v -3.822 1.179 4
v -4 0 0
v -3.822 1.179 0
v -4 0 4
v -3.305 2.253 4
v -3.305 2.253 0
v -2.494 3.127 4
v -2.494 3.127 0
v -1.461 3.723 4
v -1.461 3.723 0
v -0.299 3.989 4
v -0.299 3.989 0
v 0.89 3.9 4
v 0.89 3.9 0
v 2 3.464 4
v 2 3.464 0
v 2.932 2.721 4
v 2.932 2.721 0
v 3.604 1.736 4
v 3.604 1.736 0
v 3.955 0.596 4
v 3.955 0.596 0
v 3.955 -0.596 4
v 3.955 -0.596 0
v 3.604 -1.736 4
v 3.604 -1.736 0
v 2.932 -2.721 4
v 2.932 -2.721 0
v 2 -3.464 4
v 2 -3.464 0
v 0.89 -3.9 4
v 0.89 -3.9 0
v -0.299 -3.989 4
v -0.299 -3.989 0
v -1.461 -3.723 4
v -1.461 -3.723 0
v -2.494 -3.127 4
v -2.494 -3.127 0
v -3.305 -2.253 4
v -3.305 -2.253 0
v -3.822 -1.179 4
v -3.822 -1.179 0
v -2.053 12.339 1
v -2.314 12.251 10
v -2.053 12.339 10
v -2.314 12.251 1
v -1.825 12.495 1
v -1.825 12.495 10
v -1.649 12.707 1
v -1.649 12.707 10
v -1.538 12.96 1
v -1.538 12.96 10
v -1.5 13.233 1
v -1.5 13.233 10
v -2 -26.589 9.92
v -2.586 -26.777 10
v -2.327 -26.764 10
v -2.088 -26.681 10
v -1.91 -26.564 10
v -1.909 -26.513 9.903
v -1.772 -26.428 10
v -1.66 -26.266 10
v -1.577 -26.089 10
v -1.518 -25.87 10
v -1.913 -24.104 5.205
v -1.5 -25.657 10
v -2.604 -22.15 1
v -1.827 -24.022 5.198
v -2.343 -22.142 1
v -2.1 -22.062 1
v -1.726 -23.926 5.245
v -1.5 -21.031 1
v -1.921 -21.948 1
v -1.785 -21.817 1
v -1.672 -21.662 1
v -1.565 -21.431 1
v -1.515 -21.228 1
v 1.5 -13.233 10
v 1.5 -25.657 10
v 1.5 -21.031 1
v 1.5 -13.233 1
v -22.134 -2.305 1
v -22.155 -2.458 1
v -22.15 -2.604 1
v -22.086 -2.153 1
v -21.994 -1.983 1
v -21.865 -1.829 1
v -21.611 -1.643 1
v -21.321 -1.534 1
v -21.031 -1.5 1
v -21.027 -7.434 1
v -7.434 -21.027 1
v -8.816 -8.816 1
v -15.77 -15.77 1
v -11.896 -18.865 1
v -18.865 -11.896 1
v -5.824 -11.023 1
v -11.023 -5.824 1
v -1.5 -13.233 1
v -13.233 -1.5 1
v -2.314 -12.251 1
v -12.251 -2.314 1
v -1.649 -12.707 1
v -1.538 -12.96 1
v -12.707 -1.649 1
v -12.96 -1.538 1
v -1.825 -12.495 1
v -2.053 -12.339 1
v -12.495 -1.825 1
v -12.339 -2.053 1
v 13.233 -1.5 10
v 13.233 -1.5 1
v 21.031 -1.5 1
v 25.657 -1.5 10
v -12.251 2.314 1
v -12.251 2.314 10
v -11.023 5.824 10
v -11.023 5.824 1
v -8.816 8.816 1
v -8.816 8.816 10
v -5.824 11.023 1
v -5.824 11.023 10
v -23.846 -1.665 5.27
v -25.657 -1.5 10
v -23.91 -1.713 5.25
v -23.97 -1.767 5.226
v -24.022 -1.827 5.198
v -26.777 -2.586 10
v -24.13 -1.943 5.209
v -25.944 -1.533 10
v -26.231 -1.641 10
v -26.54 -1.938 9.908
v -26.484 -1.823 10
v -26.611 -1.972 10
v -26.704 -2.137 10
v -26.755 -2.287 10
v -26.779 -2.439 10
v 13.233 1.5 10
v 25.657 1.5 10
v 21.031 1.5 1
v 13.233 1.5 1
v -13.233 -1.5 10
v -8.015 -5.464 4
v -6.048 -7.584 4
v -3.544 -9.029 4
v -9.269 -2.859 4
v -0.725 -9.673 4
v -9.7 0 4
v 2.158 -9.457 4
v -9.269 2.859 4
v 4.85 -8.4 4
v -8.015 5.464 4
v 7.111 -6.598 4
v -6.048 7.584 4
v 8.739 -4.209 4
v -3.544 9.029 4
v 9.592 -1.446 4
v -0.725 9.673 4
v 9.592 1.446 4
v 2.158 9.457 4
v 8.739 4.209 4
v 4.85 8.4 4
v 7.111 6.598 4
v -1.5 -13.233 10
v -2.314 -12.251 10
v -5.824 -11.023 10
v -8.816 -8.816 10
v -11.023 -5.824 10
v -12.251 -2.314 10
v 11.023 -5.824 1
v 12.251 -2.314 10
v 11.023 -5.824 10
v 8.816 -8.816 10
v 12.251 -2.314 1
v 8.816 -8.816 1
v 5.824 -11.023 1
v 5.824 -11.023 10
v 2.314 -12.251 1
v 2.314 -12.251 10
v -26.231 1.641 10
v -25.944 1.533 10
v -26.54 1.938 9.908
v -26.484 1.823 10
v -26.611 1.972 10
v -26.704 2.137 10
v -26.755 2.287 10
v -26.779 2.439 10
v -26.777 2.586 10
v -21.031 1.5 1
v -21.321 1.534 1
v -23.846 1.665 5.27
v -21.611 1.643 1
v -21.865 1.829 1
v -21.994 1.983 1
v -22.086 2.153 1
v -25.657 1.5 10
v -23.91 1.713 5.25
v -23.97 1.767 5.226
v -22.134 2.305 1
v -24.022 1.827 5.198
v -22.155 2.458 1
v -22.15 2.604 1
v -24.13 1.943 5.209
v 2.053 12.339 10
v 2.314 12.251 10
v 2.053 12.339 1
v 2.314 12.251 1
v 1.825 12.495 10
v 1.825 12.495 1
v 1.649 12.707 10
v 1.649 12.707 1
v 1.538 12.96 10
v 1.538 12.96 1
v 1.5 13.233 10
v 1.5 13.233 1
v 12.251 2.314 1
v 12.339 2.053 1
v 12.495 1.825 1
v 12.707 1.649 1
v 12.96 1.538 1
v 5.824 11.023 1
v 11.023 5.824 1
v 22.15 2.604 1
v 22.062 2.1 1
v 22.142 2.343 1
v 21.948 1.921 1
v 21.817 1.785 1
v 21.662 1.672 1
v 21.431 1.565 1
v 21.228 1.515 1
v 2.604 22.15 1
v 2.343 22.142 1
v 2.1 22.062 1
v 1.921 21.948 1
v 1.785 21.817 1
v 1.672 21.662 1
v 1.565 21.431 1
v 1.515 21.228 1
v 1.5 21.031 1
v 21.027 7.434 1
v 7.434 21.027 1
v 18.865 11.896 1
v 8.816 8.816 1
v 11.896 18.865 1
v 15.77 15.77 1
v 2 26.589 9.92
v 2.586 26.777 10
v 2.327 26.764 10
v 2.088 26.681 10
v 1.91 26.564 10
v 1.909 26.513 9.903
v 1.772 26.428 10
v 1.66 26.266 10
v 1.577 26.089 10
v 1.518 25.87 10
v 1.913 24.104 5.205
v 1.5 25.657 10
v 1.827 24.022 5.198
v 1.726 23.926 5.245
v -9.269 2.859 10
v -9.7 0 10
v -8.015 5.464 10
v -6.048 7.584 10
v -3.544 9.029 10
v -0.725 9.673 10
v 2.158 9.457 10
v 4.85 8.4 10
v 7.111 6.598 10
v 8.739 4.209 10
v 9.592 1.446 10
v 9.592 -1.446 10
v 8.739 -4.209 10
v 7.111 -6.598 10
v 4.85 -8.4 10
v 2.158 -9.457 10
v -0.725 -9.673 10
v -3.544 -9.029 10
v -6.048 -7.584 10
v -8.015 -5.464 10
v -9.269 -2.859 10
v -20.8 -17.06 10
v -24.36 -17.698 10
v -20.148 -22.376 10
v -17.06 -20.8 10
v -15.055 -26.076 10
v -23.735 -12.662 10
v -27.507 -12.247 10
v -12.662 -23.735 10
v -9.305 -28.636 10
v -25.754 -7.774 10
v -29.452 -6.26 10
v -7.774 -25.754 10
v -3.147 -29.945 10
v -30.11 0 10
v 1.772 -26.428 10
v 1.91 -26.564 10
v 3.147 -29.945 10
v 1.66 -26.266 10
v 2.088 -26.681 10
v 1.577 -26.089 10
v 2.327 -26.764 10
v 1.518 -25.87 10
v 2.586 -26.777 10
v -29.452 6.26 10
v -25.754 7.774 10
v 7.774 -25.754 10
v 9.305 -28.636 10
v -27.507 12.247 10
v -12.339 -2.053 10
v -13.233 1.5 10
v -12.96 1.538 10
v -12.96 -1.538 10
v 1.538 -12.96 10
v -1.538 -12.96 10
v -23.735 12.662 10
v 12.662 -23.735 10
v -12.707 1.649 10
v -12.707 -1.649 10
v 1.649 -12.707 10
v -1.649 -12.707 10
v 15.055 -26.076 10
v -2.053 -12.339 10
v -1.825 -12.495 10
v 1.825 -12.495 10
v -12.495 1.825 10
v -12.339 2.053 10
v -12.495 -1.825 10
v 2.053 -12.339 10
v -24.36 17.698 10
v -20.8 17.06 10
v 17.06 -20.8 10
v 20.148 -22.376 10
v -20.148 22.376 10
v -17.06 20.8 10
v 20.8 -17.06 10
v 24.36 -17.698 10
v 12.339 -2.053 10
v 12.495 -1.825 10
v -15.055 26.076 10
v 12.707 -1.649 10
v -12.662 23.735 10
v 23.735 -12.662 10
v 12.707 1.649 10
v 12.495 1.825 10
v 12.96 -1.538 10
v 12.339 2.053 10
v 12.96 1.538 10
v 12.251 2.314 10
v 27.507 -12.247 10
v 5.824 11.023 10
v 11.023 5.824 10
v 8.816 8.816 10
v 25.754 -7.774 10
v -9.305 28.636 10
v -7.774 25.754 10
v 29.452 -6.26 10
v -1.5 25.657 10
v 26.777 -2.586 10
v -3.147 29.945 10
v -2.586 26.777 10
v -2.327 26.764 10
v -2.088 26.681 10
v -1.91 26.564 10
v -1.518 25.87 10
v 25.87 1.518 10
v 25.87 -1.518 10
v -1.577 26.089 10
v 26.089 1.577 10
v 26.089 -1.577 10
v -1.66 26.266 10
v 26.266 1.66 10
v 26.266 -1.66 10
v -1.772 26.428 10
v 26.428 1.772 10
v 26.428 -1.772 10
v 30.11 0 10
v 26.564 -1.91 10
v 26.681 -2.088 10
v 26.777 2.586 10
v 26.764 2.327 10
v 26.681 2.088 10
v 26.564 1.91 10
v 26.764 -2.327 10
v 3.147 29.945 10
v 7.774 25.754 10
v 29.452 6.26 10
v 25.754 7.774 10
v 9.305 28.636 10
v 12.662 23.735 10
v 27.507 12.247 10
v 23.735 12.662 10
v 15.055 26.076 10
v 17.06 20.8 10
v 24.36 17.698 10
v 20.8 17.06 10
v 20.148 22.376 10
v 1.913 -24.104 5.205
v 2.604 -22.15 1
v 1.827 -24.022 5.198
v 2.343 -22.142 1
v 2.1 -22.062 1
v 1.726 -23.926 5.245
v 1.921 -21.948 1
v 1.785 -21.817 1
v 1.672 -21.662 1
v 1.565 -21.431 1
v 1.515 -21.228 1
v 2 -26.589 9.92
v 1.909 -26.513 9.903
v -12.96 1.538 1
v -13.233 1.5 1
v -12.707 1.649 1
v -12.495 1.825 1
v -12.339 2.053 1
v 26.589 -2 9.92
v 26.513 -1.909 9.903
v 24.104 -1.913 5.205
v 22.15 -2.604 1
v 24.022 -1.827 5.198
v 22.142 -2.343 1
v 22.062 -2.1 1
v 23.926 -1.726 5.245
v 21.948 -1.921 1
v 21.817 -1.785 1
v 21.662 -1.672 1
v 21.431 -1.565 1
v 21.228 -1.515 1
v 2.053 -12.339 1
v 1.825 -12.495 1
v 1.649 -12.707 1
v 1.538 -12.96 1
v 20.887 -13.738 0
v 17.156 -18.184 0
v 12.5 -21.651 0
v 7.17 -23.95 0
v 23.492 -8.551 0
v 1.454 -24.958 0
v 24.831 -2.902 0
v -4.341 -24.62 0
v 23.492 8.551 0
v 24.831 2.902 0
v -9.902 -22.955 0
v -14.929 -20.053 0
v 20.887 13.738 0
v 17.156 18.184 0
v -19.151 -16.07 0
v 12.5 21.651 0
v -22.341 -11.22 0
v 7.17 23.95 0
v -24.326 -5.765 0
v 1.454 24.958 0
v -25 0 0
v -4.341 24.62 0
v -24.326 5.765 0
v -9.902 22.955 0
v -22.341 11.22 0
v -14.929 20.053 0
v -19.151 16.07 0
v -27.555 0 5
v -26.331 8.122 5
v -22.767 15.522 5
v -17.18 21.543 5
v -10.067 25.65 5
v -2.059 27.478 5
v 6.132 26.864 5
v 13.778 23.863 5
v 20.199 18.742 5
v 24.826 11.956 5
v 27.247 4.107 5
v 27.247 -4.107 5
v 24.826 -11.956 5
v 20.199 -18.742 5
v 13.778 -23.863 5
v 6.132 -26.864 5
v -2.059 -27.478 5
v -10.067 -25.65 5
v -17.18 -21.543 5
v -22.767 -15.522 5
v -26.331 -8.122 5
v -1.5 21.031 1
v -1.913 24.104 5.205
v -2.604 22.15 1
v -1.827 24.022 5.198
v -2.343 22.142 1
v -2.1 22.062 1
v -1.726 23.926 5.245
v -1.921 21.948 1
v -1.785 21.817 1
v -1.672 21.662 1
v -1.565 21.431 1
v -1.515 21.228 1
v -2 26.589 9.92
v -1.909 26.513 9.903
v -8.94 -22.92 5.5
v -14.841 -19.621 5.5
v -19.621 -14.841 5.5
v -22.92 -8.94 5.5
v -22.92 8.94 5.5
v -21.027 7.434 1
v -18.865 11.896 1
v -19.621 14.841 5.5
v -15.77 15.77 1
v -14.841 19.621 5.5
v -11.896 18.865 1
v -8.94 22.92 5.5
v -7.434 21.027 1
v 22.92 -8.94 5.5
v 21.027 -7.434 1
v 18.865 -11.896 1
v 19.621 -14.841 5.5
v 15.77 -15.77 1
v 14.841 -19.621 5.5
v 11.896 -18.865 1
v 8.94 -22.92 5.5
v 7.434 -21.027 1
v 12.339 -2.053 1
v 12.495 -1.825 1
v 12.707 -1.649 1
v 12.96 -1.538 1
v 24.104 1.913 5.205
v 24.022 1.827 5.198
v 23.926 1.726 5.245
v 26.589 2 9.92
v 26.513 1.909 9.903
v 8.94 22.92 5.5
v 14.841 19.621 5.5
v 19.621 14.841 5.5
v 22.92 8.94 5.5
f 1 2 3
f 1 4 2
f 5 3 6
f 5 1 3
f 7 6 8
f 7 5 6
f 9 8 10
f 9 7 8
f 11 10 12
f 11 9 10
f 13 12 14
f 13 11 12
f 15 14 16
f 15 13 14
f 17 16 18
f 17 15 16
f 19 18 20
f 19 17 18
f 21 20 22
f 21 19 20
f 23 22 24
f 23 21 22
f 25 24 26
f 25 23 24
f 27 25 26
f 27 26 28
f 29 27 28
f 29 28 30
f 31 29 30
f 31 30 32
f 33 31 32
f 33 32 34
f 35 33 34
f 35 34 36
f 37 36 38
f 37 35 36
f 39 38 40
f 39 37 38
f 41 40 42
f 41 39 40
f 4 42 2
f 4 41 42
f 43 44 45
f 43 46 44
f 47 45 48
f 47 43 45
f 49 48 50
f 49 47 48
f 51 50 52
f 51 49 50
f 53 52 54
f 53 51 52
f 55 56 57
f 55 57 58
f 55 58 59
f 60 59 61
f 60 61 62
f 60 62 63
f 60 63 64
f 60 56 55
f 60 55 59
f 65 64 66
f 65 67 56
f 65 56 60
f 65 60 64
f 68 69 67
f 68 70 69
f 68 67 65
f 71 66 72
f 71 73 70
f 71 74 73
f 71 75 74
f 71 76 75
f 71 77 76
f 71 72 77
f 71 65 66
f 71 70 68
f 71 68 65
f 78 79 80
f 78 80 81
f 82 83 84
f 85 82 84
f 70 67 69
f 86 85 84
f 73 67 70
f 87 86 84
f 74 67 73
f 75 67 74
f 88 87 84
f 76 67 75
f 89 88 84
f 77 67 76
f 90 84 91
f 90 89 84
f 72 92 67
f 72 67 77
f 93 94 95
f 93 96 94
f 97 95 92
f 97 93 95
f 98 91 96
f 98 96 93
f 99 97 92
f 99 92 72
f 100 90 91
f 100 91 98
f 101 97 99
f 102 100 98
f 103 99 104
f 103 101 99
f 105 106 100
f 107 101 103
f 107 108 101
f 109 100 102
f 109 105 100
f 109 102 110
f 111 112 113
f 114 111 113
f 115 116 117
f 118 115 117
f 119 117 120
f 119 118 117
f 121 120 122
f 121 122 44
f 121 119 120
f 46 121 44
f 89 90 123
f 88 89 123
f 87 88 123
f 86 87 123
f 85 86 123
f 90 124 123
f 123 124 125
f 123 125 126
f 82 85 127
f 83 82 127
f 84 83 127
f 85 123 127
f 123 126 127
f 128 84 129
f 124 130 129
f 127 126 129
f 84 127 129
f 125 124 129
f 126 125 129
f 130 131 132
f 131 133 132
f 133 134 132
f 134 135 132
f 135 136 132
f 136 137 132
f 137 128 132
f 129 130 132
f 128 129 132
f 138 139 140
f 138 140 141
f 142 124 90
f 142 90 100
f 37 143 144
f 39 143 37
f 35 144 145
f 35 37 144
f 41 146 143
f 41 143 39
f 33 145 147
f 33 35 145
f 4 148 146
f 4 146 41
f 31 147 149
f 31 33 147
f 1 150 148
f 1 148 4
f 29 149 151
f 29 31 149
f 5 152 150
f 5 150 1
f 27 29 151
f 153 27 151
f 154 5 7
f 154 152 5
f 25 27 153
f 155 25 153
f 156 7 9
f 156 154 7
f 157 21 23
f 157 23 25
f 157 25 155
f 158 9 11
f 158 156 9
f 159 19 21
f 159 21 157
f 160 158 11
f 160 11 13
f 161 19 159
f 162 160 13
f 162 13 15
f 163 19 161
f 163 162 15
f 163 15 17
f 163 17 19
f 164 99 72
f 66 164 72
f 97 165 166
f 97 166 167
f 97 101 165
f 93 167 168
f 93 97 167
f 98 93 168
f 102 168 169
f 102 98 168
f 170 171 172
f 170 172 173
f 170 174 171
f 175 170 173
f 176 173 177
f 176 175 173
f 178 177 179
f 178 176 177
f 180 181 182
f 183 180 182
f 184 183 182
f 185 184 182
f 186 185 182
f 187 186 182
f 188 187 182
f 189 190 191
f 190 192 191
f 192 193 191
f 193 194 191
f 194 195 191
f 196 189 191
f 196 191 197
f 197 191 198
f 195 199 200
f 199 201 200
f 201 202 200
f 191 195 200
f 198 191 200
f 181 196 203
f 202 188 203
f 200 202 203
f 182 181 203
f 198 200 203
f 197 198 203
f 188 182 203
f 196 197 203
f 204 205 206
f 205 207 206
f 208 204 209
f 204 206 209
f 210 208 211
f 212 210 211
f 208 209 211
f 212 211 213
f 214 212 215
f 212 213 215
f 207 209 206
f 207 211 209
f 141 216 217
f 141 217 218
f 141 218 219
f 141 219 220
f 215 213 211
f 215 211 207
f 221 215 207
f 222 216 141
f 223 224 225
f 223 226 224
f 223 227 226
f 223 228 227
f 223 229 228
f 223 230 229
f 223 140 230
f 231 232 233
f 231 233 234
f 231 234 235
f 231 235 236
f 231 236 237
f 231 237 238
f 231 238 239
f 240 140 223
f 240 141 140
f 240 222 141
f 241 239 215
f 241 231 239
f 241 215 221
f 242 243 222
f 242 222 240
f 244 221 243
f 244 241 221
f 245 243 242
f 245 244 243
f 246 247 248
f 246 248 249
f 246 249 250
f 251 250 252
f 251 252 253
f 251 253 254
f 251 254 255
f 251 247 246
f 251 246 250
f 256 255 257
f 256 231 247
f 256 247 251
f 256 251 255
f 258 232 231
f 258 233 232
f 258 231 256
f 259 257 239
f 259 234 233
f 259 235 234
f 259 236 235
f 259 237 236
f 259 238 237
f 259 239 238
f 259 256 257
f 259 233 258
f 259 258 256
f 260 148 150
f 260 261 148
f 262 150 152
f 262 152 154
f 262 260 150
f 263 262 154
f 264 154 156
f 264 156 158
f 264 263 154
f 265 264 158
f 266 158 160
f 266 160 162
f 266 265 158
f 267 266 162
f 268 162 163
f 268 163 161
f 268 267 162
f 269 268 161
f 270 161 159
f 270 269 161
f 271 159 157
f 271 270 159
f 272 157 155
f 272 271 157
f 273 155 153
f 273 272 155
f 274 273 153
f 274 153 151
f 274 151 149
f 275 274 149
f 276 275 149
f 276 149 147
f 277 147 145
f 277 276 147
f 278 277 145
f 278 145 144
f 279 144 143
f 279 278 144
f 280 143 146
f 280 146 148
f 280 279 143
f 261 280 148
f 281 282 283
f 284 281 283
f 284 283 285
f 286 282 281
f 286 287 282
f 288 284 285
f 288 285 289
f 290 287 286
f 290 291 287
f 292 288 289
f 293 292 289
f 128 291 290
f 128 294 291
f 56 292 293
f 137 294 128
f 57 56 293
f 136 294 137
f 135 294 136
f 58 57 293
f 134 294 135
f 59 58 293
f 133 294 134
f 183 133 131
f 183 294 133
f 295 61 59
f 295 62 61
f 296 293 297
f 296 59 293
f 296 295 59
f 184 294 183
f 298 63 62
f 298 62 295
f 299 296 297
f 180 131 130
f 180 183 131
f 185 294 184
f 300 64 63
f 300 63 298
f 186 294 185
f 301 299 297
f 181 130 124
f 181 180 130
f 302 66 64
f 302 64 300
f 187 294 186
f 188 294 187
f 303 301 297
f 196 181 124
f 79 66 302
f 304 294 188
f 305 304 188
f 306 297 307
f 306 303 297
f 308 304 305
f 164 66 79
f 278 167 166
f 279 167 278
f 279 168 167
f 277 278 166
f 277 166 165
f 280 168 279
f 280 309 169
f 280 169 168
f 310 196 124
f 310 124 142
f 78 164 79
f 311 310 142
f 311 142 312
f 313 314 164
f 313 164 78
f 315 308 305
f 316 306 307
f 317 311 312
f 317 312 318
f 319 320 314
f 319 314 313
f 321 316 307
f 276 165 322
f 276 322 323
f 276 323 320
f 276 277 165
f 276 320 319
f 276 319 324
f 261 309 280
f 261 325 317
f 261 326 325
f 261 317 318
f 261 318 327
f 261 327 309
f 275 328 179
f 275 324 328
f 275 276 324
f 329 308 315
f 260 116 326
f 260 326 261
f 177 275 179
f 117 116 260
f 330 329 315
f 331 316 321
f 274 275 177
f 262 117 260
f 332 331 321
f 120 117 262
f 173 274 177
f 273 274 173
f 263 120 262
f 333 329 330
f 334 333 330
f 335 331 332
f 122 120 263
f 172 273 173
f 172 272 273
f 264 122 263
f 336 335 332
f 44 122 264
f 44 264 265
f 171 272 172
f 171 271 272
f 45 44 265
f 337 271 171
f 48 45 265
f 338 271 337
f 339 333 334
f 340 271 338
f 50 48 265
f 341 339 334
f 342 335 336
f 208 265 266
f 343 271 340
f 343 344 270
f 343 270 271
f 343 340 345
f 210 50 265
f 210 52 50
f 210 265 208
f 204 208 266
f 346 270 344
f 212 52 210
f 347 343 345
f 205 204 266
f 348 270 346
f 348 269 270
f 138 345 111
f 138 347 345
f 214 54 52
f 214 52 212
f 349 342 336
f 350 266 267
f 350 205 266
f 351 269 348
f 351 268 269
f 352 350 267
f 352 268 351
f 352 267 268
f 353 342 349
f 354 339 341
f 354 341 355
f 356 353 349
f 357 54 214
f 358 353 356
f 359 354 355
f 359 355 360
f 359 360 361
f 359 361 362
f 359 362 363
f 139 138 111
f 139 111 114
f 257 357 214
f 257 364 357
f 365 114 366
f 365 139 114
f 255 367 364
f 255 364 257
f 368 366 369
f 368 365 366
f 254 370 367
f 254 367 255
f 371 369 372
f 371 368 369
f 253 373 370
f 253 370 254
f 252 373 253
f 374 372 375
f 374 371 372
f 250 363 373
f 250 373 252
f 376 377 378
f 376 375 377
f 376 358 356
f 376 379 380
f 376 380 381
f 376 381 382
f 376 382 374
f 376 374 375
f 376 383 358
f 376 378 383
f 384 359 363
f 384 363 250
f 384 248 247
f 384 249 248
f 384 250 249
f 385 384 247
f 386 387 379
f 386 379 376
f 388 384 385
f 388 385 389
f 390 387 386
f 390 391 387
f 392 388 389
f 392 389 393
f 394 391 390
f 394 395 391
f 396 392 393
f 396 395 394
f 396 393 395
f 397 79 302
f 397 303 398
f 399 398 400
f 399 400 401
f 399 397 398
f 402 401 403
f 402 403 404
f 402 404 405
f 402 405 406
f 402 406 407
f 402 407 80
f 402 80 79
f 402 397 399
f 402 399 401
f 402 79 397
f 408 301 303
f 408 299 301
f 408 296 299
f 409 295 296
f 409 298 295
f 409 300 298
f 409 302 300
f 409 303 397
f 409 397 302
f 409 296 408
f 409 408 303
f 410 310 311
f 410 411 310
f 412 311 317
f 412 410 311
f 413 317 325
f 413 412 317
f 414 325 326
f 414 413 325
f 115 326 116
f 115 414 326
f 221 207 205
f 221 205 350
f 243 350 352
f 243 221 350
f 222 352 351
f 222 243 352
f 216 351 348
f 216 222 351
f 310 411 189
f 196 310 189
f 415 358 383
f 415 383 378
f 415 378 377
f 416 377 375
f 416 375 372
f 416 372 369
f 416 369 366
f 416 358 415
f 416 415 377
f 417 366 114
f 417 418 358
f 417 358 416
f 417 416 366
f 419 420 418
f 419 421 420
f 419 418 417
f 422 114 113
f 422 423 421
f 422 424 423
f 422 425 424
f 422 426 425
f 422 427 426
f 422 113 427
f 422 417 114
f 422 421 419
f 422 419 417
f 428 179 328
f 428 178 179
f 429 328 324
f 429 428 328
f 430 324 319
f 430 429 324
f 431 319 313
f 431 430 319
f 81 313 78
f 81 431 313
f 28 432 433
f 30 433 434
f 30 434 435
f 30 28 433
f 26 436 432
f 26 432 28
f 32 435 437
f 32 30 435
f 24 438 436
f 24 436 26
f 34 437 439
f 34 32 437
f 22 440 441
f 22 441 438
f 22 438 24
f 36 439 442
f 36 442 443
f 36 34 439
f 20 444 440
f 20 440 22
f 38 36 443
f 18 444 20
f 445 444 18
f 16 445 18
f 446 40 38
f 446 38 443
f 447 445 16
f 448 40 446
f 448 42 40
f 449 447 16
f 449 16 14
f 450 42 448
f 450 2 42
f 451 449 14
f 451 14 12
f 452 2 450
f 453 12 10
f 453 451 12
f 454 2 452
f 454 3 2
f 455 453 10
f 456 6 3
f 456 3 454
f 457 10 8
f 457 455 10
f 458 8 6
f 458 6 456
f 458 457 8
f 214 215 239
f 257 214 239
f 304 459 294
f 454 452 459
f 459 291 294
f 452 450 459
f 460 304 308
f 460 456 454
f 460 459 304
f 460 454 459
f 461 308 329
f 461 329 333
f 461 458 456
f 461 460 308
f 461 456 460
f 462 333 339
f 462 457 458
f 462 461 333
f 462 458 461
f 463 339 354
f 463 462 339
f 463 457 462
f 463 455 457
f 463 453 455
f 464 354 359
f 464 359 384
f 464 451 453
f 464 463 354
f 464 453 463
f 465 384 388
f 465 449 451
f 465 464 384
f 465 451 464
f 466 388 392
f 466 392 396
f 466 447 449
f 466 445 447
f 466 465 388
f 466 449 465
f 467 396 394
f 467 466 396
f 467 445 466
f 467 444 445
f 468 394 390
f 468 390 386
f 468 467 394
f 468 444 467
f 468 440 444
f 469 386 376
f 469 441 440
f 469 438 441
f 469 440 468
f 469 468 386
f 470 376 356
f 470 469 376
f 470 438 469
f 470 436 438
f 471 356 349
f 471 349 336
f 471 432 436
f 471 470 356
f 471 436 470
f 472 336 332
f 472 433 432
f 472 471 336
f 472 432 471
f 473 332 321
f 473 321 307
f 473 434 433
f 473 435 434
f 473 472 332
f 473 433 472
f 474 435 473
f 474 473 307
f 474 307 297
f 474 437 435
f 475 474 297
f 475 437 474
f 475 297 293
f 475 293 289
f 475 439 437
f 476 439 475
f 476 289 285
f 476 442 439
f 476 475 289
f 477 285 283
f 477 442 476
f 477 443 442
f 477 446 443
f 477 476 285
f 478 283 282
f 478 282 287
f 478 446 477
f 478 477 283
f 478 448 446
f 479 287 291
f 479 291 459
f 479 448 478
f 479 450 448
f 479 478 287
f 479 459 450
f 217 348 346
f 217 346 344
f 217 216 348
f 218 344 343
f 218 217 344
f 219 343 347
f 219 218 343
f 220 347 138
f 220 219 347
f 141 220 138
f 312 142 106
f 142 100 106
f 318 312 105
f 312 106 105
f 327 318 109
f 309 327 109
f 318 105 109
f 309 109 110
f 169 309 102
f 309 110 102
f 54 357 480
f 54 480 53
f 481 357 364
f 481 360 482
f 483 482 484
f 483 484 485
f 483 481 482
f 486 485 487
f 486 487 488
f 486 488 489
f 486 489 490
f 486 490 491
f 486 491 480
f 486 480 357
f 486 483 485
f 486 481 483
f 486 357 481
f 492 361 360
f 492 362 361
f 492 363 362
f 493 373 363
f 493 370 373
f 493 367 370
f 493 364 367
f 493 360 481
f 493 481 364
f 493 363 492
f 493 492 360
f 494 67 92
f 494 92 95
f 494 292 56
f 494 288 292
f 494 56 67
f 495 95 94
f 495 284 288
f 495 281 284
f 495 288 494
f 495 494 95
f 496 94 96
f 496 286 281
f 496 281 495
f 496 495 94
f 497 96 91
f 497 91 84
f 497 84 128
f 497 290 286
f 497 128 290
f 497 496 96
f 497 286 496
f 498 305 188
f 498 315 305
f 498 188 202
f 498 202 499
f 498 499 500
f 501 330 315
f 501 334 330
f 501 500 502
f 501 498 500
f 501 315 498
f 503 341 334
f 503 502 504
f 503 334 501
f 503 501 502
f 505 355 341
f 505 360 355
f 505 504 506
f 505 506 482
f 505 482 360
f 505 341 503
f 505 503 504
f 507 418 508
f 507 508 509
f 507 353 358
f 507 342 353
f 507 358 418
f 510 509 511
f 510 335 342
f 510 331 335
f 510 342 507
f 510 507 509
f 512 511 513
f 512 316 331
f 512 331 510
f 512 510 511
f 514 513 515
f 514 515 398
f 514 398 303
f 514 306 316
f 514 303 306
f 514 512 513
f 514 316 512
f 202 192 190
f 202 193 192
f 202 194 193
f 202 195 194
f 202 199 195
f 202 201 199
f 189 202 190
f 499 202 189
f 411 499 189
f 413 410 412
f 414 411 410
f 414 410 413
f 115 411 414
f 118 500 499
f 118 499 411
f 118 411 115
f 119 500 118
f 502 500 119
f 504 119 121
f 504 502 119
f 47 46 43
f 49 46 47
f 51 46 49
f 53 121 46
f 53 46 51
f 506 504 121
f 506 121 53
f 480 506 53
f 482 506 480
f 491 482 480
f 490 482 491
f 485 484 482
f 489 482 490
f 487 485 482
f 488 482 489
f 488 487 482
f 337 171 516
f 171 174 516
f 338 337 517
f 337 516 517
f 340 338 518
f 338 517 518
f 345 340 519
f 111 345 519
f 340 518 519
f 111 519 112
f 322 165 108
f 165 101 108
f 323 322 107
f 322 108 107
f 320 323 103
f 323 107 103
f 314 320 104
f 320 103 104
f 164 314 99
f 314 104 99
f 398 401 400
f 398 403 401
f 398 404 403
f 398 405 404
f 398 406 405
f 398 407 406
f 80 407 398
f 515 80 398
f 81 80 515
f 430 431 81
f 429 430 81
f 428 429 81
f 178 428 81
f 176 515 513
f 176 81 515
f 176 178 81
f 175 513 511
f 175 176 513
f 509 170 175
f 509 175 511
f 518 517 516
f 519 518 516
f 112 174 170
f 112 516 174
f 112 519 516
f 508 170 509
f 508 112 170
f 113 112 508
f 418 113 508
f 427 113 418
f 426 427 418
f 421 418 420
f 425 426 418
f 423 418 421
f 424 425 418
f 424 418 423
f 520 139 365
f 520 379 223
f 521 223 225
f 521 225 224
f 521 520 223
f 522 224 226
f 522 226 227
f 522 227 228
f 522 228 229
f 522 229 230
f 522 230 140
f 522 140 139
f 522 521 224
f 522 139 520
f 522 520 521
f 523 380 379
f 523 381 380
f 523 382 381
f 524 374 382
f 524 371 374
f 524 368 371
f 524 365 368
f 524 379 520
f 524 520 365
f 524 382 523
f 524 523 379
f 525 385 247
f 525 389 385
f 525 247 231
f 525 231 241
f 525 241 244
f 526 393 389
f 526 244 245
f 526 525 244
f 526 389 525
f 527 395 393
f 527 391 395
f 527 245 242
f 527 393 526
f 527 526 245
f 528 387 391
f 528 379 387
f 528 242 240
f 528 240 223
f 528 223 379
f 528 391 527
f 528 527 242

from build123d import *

# Parameters (mm, degrees)
F4_R = 1


with BuildPart() as f1:
    # F0 (on Front) → F1 (revolve)
    with BuildSketch(Plane.XZ):
        Polygon((-30.1100046678, 10), (-25, 0), (-4, 0), (-4, 4), (-9.7, 4), (-9.7, 10), (-12.467299588, 10), (-12.467299588, 1), (-22.3023900814, 1), (-26.9013942824, 10), align=None)
    revolve(axis=Axis((0, 0, 12.4949840829), (0, 0, -1)))

    # F2 (on face) → F3 (join, up to the next surface of F1)
    with BuildSketch(Plane.XY.offset(10)):
        with BuildLine():
            ThreePointArc((1.5, 26.859542333), (0, 26.9013942824), (-1.5, 26.859542333))
            Line((-1.5, 26.859542333), (-1.5, 12.3767345862))
            ThreePointArc((-1.5, 12.3767345862), (0, 12.467299588), (1.5, 12.3767345862))
            Line((1.5, 12.3767345862), (1.5, 26.859542333))
        make_face()
        with BuildLine():
            Line((26.859542333, 1.5), (12.3767345862, 1.5))
            ThreePointArc((12.3767345862, 1.5), (12.467299588, 0), (12.3767345862, -1.5))
            Line((12.3767345862, -1.5), (26.859542333, -1.5))
            ThreePointArc((26.859542333, -1.5), (26.9013942824, 0), (26.859542333, 1.5))
        make_face()
        with BuildLine():
            Line((-12.3767345862, 1.5), (-26.859542333, 1.5))
            ThreePointArc((-26.859542333, 1.5), (-26.9013942824, 0), (-26.859542333, -1.5))
            Line((-26.859542333, -1.5), (-12.3767345862, -1.5))
            ThreePointArc((-12.3767345862, -1.5), (-12.467299588, 0), (-12.3767345862, 1.5))
        make_face()
        with BuildLine():
            ThreePointArc((1.5, -12.3767345862), (0, -12.467299588), (-1.5, -12.3767345862))
            Line((-1.5, -12.3767345862), (-1.5, -26.859542333))
            ThreePointArc((-1.5, -26.859542333), (0, -26.9013942824), (1.5, -26.859542333))
            Line((1.5, -26.859542333), (1.5, -12.3767345862))
        make_face()
    extrude(until=Until.NEXT, dir=(0, 0, -1))

    # F4
    f4_edges = [f1.edges().sort_by_distance(p)[0] for p in [
        (-1.5, 24.556037, 5.499836),
        (1.5, 24.556037, 5.499836),
        (-24.556037, 1.5, 5.499836),
        (-24.556037, -1.5, 5.499836),
        (-1.5, -24.556037, 5.499836),
        (24.556037, 1.5, 5.499836),
        (24.556037, -1.5, 5.499836),
        (1.5, -24.556037, 5.499836),
        (1.5, 12.376735, 5.5),
        (12.376735, 1.5, 5.5),
        (12.376735, -1.5, 5.5),
        (1.5, -12.376735, 5.5),
        (-1.5, -12.376735, 5.5),
        (-12.376735, -1.5, 5.5),
        (-12.376735, 1.5, 5.5),
        (-1.5, 12.376735, 5.5),
    ]]
    fillet(f4_edges, radius=F4_R)


solid = f1.part
